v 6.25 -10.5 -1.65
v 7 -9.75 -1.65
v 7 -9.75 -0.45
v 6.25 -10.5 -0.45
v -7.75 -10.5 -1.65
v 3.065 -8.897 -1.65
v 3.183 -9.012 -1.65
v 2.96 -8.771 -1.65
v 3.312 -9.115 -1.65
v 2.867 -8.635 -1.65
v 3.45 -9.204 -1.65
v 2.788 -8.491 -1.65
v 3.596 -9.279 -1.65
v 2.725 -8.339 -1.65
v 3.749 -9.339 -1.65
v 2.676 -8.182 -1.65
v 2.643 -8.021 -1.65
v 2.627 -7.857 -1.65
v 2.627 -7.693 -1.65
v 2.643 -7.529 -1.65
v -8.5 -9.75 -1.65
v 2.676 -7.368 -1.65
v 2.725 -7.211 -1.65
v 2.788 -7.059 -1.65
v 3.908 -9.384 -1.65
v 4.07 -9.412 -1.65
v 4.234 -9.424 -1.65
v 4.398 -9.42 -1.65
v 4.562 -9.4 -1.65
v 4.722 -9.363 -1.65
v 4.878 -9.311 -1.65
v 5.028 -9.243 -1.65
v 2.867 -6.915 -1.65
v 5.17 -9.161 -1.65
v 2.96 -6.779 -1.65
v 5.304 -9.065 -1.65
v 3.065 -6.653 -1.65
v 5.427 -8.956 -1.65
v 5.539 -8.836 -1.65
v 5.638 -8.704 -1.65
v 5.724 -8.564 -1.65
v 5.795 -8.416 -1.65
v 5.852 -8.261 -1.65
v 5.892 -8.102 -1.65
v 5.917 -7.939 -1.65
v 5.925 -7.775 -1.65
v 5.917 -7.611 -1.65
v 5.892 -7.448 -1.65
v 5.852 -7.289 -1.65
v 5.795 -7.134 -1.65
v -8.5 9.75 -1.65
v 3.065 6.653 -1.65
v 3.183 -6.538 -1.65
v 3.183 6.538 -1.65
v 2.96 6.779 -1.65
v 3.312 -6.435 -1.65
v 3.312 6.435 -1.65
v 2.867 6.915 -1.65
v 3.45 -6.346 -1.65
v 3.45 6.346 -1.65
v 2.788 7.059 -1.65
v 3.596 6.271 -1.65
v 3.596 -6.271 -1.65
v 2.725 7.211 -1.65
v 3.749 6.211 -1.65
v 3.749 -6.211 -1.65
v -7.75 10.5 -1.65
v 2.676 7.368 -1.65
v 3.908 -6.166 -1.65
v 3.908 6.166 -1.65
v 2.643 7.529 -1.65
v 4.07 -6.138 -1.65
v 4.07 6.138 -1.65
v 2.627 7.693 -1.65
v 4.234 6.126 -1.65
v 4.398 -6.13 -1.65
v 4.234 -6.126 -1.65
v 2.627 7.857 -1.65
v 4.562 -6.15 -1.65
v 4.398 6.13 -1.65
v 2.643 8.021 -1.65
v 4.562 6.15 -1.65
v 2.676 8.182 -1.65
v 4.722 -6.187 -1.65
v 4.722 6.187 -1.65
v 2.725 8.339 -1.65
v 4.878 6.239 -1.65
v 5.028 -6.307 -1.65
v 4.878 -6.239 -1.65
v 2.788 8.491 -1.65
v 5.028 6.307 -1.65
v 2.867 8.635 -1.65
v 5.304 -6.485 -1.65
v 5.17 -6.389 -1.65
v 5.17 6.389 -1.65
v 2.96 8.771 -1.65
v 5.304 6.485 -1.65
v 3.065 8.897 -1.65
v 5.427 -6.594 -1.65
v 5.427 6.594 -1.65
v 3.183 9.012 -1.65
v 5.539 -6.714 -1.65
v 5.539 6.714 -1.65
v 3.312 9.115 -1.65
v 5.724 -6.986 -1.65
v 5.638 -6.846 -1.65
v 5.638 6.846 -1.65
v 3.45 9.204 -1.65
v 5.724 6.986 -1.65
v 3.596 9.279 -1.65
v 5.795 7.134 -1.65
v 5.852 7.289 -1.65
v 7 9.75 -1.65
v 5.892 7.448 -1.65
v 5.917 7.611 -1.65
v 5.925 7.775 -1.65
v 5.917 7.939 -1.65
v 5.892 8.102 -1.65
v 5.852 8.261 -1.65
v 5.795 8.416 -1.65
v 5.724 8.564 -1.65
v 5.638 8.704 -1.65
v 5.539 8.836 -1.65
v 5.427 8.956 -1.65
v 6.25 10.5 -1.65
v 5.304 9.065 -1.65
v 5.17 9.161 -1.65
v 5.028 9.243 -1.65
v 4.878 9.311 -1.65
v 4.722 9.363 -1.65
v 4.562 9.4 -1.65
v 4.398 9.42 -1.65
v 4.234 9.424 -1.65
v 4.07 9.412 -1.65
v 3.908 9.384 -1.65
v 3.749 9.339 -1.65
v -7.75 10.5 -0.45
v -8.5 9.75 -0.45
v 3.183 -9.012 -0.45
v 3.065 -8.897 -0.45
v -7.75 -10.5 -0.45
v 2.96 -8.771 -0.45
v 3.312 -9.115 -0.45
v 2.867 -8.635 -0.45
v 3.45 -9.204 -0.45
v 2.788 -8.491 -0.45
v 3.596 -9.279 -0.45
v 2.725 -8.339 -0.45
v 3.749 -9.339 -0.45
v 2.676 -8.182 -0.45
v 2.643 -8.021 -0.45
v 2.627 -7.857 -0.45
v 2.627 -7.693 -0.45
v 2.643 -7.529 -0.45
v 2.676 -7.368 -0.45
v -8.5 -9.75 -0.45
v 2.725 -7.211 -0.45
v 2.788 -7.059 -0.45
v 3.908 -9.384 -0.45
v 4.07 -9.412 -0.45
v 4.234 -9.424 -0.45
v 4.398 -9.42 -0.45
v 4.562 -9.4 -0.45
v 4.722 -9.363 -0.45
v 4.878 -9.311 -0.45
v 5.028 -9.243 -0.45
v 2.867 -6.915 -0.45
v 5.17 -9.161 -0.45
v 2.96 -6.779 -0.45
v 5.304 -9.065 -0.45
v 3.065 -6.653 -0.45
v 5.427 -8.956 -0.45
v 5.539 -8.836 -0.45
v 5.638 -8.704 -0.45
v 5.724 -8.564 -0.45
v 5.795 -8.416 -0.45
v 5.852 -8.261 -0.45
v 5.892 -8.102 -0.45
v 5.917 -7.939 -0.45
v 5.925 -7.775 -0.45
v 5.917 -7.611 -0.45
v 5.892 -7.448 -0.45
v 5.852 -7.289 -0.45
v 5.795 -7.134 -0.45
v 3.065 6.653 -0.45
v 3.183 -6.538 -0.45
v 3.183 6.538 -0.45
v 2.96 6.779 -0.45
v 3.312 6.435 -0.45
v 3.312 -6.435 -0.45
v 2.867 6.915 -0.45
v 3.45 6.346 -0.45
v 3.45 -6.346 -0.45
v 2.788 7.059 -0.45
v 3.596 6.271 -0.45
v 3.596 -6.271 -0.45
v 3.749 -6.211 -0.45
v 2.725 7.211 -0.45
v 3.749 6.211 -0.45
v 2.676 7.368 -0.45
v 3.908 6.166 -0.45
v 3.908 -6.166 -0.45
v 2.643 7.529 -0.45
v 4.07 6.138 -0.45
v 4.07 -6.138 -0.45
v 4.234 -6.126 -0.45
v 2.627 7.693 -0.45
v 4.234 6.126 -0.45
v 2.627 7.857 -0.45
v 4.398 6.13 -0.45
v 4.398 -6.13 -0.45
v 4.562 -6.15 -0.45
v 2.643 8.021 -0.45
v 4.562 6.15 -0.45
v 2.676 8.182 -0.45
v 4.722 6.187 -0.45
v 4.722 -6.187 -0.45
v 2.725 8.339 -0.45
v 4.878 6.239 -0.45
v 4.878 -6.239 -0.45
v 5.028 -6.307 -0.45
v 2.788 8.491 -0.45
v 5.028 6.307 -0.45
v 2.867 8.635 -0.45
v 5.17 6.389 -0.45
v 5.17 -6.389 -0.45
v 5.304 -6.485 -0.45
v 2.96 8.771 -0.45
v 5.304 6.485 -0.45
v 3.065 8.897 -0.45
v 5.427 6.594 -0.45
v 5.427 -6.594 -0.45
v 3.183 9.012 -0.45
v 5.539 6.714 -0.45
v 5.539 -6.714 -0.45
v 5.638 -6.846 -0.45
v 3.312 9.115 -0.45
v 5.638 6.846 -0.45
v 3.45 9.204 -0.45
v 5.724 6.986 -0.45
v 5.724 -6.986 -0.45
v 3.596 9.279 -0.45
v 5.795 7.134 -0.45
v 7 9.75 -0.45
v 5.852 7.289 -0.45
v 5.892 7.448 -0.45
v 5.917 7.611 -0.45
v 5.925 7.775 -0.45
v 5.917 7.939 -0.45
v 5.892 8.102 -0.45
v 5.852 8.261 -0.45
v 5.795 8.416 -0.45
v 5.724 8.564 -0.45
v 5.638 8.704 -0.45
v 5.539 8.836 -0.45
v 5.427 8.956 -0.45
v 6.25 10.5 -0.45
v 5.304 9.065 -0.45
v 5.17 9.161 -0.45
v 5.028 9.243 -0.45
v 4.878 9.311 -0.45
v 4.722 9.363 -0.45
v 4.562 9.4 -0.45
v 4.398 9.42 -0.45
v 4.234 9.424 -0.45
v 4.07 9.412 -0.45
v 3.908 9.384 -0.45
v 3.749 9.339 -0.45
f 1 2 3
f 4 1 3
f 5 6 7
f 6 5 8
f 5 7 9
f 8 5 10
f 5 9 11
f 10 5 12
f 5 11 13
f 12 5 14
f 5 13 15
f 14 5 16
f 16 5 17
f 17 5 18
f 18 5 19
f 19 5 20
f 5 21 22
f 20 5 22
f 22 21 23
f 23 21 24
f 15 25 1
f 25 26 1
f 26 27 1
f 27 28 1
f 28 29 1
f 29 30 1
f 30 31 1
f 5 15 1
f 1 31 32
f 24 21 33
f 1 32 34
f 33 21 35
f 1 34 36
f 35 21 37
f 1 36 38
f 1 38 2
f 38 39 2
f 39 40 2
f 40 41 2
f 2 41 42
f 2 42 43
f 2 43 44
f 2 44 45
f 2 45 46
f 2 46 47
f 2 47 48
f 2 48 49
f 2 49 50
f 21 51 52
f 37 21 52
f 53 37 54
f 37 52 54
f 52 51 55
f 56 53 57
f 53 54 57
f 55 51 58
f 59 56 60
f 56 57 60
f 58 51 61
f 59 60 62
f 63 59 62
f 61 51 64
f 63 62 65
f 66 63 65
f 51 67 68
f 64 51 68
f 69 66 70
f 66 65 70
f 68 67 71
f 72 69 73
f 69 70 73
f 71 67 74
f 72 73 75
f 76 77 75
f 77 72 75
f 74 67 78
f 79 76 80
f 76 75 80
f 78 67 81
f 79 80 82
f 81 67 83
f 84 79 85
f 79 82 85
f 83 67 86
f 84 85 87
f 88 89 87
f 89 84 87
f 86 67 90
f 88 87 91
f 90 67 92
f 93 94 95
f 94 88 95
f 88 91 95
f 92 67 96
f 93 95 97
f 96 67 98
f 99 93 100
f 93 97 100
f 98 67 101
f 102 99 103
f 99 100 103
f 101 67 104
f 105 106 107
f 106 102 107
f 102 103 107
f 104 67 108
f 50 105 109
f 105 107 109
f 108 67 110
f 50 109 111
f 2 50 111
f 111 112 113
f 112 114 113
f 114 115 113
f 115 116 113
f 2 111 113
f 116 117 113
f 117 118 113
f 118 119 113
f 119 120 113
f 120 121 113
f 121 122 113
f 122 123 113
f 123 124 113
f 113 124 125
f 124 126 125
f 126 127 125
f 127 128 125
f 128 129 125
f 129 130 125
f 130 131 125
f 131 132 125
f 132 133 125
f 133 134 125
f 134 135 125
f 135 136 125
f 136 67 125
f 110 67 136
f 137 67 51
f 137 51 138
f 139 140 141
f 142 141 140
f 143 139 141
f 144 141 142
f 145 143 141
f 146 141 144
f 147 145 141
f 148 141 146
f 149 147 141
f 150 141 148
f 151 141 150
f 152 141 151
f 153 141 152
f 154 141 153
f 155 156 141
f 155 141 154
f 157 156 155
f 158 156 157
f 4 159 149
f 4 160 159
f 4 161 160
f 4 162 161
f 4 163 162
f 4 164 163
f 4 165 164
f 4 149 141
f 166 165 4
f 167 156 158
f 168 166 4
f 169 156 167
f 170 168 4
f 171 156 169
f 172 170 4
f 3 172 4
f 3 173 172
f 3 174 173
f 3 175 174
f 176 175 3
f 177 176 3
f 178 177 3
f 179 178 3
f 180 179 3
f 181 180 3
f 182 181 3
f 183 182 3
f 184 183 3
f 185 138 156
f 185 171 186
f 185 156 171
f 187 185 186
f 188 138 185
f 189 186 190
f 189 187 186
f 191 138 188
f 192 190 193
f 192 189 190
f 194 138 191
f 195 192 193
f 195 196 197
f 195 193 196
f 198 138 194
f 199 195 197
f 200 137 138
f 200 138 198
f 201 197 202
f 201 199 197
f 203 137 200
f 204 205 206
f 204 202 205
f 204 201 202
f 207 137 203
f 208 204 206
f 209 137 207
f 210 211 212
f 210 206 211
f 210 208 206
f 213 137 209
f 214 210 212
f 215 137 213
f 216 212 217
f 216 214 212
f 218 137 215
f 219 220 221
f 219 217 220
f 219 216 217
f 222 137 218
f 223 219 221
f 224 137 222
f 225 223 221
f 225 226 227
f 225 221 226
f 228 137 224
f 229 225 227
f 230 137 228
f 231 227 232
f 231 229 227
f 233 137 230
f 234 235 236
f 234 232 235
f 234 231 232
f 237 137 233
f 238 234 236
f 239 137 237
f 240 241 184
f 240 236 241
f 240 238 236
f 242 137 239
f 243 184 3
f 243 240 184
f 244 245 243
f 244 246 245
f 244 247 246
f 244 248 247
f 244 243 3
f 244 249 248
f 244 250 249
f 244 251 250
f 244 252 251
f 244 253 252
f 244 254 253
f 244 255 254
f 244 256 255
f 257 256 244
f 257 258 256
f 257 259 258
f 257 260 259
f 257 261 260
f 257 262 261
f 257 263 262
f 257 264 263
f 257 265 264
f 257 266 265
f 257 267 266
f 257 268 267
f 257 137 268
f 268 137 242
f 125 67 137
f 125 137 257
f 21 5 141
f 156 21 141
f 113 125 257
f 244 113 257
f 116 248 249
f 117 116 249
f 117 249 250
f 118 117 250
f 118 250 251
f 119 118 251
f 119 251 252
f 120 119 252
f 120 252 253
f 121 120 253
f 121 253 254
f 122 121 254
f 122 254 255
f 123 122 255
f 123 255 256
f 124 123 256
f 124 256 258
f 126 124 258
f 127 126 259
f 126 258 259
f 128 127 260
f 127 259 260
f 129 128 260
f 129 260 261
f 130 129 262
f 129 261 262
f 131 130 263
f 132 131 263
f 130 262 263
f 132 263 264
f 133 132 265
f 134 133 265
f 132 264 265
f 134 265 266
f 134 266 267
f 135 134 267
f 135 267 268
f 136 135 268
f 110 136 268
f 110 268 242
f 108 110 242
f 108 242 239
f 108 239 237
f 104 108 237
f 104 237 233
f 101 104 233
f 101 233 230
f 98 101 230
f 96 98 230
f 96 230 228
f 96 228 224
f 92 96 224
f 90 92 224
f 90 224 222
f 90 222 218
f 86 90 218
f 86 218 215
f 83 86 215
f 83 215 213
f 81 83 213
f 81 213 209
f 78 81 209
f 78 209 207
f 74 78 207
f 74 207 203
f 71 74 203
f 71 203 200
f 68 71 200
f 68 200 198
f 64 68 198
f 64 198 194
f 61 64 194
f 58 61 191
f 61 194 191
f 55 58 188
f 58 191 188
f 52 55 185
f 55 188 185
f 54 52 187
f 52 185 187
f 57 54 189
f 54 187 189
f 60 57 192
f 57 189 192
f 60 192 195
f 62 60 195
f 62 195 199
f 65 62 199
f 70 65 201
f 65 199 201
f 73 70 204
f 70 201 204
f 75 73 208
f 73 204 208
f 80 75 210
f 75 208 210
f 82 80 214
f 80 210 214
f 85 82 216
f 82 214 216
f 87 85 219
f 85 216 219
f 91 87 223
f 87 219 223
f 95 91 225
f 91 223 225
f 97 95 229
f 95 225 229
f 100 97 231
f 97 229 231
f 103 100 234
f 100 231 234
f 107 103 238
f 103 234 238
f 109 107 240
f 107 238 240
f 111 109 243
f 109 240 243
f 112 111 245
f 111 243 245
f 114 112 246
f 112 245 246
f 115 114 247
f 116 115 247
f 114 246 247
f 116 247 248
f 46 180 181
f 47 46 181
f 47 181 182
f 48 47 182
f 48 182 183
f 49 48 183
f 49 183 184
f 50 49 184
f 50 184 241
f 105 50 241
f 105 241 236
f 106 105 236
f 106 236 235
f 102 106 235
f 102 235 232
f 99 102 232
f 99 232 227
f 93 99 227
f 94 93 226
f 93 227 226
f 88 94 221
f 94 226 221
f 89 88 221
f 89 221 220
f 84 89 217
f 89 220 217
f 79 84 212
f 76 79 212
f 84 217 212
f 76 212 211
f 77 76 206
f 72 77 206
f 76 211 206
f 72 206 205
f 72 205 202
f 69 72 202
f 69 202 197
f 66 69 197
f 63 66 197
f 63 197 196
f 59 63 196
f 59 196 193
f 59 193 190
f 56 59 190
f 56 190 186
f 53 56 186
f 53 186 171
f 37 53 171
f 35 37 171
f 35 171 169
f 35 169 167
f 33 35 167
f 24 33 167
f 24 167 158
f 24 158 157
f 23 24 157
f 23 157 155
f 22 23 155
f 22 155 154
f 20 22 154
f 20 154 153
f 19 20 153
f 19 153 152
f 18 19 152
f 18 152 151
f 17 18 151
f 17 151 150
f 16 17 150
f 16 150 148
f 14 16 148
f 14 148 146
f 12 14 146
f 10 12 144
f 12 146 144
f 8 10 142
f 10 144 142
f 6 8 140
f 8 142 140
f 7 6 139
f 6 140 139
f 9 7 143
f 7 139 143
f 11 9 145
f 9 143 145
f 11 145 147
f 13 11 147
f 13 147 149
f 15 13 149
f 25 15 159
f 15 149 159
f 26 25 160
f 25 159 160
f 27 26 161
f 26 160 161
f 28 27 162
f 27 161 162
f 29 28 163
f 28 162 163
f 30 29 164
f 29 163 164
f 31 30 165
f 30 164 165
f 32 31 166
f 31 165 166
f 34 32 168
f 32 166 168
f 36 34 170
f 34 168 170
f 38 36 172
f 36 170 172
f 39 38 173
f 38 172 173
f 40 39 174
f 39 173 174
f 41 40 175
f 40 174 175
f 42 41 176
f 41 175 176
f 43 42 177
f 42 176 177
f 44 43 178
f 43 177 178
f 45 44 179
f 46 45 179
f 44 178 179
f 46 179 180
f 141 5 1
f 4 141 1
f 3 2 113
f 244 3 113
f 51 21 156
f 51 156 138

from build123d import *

# Parameters (mm, degrees)
SKETCH003_W     = 15.5
SKETCH003_H     = 21
PAD002_DEPTH    = 1.2
CHAMFER_SIZE    = 0.75
SKETCH004_R     = 1.65
POCKET001_DEPTH = 5


with BuildPart() as part:
    # Sketch003 → Pad002 (new body)
    with BuildSketch(Plane.XY):
        with Locations((-0.75, 0)):
            Rectangle(SKETCH003_W, SKETCH003_H)
    extrude(amount=PAD002_DEPTH)

    # Chamfer
    chamfer_edges = [part.edges().sort_by_distance(p)[0] for p in [
        (-8.5, -10.5, 0.6),
        (7, 10.5, 0.6),
        (7, -10.5, 0.6),
        (-8.5, 10.5, 0.6),
    ]]
    chamfer(chamfer_edges, length=CHAMFER_SIZE)

    # Sketch004 (on Face5 of Chamfer) → Pocket001 (cut)
    with BuildSketch(Plane.XY.offset(1.2)):
        with Locations((4.275, 7.775)):
            Circle(SKETCH004_R)
        with Locations((4.275, -7.775)):
            Circle(SKETCH004_R)
    extrude(amount=-POCKET001_DEPTH, mode=Mode.SUBTRACT)


with BuildPart() as part_1:
    # Body placement: moved
    add(part.part.moved(Location((0, 0, -1.65))))


solid = part_1.part
